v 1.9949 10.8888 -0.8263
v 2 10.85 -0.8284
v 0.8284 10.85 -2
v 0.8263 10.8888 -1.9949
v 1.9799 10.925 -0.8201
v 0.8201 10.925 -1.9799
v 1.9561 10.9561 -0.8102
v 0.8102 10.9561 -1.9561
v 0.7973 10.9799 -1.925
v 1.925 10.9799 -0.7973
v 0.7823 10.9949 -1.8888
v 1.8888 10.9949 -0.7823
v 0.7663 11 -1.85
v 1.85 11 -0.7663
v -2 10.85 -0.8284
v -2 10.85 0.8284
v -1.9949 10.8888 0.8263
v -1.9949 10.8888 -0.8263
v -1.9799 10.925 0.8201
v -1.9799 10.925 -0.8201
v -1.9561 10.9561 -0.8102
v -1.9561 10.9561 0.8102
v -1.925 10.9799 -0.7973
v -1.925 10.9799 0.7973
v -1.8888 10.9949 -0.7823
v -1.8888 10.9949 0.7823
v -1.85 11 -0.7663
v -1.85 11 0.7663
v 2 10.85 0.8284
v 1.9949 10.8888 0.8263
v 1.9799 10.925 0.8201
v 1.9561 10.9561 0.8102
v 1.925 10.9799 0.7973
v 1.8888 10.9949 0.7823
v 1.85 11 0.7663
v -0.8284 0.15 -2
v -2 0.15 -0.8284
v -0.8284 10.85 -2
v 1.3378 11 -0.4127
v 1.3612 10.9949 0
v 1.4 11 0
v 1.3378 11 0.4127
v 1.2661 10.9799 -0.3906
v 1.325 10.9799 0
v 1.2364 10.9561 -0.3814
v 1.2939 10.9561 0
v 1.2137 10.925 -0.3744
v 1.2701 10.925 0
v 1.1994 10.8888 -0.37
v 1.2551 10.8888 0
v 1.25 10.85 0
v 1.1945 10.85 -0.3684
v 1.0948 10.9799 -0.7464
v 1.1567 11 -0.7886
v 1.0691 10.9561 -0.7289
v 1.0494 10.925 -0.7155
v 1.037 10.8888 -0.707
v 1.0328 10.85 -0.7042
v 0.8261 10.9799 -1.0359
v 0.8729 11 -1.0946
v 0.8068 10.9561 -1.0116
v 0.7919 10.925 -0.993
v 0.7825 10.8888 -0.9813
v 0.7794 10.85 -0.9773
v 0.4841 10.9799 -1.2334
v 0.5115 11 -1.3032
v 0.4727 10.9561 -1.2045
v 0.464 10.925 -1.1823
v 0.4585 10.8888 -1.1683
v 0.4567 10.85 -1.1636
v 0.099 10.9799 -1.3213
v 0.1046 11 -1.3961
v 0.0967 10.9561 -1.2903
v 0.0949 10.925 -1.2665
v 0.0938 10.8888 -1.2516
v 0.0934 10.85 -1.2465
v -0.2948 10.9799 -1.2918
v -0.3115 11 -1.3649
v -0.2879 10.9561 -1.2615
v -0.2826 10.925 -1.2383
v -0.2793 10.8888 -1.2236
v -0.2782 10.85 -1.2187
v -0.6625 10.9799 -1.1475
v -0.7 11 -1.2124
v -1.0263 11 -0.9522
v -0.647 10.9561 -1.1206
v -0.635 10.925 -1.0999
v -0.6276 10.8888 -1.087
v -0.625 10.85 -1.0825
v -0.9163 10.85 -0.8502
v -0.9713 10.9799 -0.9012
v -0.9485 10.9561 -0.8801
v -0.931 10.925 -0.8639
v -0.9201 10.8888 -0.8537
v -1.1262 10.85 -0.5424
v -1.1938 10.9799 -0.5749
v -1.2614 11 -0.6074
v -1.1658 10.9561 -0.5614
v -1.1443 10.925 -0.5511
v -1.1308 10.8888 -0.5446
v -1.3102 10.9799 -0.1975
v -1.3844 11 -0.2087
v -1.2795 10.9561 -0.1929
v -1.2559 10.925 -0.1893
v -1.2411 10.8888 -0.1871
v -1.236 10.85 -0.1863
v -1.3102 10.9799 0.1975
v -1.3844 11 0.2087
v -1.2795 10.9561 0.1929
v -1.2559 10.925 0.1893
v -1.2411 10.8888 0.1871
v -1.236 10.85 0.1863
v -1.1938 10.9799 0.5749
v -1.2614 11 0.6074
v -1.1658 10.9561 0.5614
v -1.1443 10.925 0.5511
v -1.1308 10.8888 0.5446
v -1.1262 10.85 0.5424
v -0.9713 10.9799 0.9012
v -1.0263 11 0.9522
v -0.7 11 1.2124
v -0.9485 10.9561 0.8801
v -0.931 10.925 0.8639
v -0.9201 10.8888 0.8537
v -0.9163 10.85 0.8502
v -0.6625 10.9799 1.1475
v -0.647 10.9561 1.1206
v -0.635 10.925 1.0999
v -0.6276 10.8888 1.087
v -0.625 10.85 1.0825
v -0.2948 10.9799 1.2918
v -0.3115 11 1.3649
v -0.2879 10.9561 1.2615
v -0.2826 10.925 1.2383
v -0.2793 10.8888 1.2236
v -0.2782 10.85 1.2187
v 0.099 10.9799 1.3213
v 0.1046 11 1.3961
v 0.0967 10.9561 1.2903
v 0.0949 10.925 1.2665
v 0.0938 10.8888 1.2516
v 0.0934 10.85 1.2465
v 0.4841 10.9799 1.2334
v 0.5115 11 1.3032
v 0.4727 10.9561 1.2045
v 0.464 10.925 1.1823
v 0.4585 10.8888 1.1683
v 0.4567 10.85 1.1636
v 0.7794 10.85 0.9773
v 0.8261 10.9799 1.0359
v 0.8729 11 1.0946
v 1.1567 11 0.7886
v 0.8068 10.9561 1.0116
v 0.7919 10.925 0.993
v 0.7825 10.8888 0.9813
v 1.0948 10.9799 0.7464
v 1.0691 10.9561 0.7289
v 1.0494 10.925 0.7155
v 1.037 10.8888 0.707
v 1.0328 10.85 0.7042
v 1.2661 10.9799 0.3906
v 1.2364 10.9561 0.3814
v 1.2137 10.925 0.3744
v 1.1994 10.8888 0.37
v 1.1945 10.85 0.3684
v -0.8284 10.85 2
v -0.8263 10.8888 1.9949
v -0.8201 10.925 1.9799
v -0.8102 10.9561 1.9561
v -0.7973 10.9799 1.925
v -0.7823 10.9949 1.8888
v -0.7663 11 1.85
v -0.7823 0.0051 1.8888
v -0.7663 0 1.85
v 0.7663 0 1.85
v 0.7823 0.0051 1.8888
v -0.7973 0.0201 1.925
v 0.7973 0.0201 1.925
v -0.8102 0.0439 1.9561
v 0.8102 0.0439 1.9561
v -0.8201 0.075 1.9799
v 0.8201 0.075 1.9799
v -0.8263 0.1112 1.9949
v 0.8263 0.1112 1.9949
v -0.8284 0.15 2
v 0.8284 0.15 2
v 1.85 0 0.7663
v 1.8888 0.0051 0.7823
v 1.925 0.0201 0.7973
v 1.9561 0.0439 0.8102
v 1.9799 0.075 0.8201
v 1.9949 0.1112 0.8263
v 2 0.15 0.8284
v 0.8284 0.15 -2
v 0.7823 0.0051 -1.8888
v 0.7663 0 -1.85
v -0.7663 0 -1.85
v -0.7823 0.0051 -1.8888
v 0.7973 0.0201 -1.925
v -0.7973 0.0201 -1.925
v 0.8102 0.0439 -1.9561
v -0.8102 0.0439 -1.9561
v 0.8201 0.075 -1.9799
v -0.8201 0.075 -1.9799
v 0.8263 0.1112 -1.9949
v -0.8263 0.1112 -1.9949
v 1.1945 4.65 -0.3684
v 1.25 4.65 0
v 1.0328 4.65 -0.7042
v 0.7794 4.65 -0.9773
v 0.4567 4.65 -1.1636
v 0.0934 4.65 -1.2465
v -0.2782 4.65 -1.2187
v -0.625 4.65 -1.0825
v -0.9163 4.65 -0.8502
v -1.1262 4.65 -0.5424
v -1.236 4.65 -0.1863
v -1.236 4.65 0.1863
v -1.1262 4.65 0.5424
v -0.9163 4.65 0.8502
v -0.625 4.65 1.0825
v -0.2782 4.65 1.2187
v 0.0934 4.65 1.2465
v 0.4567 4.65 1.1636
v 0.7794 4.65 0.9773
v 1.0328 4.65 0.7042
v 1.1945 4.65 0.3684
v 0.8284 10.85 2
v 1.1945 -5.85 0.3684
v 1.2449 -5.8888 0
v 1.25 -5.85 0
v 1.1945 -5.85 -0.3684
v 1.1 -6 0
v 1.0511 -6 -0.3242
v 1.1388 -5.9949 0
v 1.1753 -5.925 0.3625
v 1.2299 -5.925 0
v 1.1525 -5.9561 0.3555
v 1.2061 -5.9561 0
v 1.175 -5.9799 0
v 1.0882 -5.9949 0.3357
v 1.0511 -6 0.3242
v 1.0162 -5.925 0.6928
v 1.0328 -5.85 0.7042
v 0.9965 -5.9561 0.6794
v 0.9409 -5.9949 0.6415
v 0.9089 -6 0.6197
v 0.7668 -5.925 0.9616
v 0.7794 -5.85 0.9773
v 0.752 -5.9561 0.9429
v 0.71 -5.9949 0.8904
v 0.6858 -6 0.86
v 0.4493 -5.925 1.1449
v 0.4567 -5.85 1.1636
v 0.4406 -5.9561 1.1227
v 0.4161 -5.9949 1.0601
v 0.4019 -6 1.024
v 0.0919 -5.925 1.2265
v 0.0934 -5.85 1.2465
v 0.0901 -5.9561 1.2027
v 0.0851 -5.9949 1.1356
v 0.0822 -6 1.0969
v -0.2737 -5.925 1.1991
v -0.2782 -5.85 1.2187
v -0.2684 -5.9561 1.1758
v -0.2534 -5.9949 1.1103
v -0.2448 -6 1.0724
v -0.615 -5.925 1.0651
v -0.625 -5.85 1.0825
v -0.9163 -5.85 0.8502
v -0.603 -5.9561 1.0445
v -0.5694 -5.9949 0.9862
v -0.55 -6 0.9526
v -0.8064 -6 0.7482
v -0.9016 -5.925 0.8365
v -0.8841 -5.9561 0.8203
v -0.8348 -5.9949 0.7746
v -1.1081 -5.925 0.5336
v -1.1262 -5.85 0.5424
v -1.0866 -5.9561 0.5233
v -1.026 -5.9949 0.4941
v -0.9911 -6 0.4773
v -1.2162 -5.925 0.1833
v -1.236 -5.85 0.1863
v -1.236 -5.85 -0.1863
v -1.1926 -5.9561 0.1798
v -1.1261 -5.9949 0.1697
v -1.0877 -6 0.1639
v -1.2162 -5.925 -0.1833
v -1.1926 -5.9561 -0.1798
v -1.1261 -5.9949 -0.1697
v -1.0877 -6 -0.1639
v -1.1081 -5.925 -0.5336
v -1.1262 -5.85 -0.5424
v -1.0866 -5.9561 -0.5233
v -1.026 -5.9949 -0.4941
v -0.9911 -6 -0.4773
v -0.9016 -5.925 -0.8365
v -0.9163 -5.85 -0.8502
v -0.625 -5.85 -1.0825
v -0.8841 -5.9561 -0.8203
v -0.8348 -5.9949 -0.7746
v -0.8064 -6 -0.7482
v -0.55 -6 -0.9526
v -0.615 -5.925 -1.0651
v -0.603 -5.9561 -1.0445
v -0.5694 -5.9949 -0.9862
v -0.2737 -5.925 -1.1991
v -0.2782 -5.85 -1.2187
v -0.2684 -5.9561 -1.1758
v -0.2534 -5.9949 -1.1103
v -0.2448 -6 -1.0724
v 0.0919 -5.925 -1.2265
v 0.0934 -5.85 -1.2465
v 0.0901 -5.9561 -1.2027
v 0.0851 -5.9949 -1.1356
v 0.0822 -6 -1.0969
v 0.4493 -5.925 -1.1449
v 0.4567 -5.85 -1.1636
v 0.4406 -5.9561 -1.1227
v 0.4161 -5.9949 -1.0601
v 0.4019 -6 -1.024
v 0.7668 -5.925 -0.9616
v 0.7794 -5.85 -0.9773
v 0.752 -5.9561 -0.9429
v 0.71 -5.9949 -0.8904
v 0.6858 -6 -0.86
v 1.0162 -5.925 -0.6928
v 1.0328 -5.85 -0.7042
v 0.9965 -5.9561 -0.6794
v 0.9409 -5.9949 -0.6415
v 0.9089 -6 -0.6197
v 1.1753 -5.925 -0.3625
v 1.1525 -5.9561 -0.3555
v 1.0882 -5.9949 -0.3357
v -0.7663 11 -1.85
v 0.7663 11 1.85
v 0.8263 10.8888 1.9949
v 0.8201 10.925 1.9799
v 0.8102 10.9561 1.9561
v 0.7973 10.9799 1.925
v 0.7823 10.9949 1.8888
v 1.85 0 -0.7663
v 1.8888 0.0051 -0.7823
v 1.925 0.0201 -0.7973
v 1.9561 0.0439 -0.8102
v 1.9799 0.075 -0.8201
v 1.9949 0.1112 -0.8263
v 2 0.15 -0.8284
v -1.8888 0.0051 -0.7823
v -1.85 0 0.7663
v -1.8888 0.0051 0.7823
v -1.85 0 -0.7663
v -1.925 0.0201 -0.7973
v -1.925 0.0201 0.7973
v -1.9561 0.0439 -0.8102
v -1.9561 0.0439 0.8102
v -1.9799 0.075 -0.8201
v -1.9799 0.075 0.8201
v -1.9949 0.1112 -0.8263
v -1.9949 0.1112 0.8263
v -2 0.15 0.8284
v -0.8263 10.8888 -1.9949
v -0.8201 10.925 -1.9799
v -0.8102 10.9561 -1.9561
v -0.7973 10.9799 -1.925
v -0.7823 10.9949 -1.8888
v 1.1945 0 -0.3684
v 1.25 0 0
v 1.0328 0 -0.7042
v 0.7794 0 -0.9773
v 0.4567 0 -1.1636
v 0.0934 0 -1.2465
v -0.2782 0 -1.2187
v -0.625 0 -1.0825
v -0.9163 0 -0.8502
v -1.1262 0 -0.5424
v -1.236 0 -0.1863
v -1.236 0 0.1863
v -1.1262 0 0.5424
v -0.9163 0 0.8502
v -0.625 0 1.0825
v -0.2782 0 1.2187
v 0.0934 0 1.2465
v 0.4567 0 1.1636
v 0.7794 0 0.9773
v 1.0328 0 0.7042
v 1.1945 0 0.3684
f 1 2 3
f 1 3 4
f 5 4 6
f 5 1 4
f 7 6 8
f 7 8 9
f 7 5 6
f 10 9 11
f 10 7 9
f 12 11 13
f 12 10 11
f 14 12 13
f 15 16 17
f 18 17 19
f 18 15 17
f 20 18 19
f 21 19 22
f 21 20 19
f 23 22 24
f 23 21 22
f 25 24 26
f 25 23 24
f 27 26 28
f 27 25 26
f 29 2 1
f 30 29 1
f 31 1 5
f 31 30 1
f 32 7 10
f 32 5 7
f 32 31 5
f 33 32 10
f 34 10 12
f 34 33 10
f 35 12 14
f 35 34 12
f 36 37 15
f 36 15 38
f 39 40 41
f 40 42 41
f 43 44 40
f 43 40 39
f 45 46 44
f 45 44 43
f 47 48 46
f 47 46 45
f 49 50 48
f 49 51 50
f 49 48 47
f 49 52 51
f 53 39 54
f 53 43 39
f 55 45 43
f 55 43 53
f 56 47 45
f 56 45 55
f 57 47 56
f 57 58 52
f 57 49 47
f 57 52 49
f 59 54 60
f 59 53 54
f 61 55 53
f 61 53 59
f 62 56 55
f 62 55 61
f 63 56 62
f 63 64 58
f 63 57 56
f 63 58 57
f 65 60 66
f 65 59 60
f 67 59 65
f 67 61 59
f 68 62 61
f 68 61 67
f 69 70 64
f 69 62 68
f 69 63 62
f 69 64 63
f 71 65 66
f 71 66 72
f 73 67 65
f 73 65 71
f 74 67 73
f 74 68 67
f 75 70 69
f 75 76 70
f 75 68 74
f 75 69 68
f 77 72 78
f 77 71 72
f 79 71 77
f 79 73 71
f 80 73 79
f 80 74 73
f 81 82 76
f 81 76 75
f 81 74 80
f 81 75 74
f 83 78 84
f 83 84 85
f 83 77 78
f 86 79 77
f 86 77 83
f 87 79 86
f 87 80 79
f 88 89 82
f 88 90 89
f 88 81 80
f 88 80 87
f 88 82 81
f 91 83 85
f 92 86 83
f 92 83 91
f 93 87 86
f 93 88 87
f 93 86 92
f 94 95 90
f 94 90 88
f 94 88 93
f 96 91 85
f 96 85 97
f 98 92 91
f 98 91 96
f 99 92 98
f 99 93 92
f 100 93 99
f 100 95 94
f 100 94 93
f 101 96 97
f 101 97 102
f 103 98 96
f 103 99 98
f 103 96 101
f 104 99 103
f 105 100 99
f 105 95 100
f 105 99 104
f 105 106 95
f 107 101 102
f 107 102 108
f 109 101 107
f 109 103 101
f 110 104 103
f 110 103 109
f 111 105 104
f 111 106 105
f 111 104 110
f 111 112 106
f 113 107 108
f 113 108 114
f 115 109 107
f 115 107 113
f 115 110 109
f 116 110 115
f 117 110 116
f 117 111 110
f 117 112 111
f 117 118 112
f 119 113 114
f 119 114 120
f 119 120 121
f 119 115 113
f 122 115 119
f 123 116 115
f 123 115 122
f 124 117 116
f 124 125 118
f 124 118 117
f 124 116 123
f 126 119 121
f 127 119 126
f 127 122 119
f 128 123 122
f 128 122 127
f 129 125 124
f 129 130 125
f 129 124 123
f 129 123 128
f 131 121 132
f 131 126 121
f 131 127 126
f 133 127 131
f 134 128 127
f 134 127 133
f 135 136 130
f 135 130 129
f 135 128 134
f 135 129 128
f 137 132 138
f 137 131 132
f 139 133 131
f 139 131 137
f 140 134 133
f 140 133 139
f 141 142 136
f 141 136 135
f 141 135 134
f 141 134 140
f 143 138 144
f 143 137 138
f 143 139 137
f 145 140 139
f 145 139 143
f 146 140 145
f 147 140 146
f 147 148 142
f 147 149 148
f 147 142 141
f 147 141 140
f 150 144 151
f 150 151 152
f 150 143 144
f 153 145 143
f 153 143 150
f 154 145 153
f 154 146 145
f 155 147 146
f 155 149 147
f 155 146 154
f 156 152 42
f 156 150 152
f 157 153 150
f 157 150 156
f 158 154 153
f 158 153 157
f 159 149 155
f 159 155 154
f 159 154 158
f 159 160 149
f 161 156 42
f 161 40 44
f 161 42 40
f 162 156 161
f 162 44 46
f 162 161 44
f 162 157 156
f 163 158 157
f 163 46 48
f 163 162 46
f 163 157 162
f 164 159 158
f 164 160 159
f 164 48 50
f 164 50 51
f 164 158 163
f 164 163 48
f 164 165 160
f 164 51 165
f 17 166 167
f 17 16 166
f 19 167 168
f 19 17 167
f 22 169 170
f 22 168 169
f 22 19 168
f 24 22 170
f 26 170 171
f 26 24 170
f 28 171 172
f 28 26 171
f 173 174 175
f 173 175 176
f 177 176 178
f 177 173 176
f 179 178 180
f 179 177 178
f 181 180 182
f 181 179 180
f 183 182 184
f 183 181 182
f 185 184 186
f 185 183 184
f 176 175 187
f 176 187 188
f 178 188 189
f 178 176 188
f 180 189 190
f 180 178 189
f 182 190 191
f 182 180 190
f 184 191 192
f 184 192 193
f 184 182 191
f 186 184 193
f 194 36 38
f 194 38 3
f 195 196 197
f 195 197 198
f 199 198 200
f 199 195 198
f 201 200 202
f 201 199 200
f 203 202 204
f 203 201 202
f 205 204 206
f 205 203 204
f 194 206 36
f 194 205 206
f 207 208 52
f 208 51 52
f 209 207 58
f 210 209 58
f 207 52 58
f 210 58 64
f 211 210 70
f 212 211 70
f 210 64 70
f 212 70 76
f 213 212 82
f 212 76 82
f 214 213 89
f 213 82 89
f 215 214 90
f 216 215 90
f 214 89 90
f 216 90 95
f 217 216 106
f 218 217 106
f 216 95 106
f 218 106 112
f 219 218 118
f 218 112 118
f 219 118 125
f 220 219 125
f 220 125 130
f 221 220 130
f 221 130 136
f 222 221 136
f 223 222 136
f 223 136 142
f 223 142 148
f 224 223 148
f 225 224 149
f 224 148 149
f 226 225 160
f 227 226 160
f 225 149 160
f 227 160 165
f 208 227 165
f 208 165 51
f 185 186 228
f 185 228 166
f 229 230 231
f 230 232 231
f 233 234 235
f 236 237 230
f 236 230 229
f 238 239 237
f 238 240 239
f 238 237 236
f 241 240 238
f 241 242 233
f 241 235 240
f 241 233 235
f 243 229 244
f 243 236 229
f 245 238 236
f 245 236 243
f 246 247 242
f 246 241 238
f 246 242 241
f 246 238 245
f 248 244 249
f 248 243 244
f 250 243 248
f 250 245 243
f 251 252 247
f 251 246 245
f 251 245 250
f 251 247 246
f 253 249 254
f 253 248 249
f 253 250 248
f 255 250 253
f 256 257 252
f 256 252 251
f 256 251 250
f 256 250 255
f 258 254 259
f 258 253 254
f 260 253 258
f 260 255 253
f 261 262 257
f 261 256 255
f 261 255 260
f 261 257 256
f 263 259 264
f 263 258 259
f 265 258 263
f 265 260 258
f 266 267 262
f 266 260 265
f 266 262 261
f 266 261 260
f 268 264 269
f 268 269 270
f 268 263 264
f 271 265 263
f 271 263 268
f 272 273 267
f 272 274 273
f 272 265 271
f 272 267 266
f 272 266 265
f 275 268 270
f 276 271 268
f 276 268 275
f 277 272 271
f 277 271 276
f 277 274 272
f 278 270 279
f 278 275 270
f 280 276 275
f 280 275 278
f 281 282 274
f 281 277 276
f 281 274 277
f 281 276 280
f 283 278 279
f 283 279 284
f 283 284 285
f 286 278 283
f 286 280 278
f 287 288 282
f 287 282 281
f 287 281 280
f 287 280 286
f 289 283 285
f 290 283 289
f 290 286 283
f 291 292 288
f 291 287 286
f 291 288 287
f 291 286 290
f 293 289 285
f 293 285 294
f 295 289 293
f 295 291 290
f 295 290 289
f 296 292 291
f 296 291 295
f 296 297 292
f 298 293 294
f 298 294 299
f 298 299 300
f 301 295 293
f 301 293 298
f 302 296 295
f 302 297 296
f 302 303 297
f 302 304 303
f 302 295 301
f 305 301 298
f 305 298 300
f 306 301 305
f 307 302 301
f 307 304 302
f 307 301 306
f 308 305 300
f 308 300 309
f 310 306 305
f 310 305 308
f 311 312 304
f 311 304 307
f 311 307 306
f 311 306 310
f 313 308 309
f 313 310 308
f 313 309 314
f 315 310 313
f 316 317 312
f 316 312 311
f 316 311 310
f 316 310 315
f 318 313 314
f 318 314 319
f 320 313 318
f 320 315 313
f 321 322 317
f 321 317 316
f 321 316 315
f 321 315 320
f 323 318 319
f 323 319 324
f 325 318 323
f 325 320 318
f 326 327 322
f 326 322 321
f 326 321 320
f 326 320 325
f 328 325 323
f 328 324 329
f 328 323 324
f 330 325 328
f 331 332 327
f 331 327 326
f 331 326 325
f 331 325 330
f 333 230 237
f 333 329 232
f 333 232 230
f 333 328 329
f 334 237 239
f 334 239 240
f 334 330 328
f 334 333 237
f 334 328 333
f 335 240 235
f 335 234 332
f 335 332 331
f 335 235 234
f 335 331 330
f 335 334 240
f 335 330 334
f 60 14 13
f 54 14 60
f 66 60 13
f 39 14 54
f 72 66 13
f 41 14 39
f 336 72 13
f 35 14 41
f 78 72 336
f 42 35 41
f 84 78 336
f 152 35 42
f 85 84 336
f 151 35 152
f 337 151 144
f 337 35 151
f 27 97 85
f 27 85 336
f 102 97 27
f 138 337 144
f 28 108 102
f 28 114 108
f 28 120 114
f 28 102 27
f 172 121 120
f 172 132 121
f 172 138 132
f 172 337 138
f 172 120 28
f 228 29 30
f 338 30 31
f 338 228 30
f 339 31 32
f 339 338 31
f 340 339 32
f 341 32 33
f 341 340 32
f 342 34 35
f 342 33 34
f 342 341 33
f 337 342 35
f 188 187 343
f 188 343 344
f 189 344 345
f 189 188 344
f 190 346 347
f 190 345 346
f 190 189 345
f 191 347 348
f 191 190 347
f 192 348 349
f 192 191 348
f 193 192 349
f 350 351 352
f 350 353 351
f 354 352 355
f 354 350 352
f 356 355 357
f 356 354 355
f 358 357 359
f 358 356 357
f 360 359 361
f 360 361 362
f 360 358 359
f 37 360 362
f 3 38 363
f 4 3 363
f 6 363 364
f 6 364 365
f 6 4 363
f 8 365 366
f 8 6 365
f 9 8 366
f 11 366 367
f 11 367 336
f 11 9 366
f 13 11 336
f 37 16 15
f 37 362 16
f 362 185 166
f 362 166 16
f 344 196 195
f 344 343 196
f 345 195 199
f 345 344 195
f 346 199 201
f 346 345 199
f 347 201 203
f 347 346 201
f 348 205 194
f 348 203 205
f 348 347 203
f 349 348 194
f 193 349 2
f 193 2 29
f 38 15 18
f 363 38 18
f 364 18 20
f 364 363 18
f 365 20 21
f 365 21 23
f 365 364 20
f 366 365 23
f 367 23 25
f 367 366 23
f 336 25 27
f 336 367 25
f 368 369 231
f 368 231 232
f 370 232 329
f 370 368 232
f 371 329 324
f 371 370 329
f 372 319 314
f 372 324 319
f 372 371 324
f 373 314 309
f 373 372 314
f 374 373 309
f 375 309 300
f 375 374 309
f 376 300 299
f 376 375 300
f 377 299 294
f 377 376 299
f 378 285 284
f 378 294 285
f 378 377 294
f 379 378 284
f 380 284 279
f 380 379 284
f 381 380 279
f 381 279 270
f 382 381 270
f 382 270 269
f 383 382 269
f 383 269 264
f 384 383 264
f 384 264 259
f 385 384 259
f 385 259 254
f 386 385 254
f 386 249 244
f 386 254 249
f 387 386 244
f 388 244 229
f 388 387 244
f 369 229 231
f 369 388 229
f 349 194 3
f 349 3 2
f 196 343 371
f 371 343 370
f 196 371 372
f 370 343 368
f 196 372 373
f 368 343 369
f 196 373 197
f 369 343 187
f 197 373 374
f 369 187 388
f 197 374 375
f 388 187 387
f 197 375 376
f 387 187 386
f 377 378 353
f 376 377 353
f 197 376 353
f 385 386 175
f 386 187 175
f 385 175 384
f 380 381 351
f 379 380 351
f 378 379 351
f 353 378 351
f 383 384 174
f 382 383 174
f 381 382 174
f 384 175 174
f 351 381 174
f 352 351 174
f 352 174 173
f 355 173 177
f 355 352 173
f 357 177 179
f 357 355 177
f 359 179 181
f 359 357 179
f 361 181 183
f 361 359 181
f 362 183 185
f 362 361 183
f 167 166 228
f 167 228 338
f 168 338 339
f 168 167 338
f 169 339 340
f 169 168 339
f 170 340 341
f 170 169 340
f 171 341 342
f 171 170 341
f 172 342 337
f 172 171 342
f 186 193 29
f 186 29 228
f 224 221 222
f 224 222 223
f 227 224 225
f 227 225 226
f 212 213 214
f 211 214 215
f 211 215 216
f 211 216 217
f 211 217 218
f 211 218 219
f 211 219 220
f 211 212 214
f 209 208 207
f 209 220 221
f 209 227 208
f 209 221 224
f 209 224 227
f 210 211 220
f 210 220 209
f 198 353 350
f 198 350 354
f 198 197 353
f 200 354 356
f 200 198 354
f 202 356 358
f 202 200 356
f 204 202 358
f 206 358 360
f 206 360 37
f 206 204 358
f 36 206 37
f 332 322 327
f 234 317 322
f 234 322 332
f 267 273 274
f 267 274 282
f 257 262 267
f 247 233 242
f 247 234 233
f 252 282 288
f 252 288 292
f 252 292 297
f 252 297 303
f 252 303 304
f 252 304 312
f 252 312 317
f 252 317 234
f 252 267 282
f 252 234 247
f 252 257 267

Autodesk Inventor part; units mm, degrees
ref_plane "YZ Plane" through (0, 0, 0) normal (1, 0, 0) x (0, 1, 0)
ref_plane "XZ Plane" through (0, 0, 0) normal (0, 1, 0) x (-1, 0, 0)
ref_plane "XY Plane" through (0, 0, 0) normal (0, 0, 1) x (1, 0, 0)
sketch "Sketch1" plane through (0, 0, 0) normal (0, 1, 0) x (-1, 0, 0)
  line L0 (0.8284, -2) -> (-0.8284, -2)
  line L1 (-0.8284, -2) -> (-2, -0.8284)
  line L2 (-2, -0.8284) -> (-2, 0.8284)
  line L3 (-2, 0.8284) -> (-0.8284, 2)
  line L4 (-0.8284, 2) -> (0.8284, 2)
  line L5 (0.8284, 2) -> (2, 0.8284)
  line L6 (2, 0.8284) -> (2, -0.8284)
  line L7 (2, -0.8284) -> (0.8284, -2)
  point P0 (0, 0)
  point P1 (0, -2)
  point P2 (2, 0)
  dimension "d1" = 135
  dimension "d2" = 4
extrude "Extrusion1" add sketch "Sketch1" along normal blind 11
sketch "Sketch2" plane through (0, 11, 0) normal (0, 1, 0) x (1, 0, 0)
  circle A0 centre (0, 0) radius 1.25
  dimension "d5" = 2.5
extrude "Extrusion2" cut sketch "Sketch2" against normal blind 6.35
thread "Thread1" size "M2.5x0.45" class "6H" standard "ANSI Metric M Profile" full length
sketch "Sketch3" plane through (0, 0, 0) normal (0, -1, 0) x (1, 0, 0)
  circle A0 centre (0, 0) radius 1.25
  dimension "d10" = 2.5
extrude "Extrusion3" add sketch "Sketch3" along normal blind 6
thread "Thread2" size "M2.5x0.45" class "6g" standard "ANSI Metric M Profile" full length
fillet "Fillet1" radius 0.15 16 edges at (1.4142, 11, 1.4142) (2, 11, 0) (1.4142, 11, -1.4142) (0, 11, -2) (-1.4142, 11, -1.4142) (-2, 11, 0) (-1.4142, 11, 1.4142) (0, 11, 2) (1.4142, 0, 1.4142) (0, 0, 2) (-1.4142, 0, 1.4142) (-2, 0, 0) (0, 0, -2) (1.4142, 0, -1.4142) (2, 0, 0) (-1.4142, 0, -1.4142)
fillet "Fillet2" radius 0.15 1 edges at (-1.25, -6, 0)
fillet "Fillet3" radius 0.15 1 edges at (-1.25, 11, 0)
properties part number "11mm M2.5 standoff" material "Steel, High Strength, Low Alloy"
